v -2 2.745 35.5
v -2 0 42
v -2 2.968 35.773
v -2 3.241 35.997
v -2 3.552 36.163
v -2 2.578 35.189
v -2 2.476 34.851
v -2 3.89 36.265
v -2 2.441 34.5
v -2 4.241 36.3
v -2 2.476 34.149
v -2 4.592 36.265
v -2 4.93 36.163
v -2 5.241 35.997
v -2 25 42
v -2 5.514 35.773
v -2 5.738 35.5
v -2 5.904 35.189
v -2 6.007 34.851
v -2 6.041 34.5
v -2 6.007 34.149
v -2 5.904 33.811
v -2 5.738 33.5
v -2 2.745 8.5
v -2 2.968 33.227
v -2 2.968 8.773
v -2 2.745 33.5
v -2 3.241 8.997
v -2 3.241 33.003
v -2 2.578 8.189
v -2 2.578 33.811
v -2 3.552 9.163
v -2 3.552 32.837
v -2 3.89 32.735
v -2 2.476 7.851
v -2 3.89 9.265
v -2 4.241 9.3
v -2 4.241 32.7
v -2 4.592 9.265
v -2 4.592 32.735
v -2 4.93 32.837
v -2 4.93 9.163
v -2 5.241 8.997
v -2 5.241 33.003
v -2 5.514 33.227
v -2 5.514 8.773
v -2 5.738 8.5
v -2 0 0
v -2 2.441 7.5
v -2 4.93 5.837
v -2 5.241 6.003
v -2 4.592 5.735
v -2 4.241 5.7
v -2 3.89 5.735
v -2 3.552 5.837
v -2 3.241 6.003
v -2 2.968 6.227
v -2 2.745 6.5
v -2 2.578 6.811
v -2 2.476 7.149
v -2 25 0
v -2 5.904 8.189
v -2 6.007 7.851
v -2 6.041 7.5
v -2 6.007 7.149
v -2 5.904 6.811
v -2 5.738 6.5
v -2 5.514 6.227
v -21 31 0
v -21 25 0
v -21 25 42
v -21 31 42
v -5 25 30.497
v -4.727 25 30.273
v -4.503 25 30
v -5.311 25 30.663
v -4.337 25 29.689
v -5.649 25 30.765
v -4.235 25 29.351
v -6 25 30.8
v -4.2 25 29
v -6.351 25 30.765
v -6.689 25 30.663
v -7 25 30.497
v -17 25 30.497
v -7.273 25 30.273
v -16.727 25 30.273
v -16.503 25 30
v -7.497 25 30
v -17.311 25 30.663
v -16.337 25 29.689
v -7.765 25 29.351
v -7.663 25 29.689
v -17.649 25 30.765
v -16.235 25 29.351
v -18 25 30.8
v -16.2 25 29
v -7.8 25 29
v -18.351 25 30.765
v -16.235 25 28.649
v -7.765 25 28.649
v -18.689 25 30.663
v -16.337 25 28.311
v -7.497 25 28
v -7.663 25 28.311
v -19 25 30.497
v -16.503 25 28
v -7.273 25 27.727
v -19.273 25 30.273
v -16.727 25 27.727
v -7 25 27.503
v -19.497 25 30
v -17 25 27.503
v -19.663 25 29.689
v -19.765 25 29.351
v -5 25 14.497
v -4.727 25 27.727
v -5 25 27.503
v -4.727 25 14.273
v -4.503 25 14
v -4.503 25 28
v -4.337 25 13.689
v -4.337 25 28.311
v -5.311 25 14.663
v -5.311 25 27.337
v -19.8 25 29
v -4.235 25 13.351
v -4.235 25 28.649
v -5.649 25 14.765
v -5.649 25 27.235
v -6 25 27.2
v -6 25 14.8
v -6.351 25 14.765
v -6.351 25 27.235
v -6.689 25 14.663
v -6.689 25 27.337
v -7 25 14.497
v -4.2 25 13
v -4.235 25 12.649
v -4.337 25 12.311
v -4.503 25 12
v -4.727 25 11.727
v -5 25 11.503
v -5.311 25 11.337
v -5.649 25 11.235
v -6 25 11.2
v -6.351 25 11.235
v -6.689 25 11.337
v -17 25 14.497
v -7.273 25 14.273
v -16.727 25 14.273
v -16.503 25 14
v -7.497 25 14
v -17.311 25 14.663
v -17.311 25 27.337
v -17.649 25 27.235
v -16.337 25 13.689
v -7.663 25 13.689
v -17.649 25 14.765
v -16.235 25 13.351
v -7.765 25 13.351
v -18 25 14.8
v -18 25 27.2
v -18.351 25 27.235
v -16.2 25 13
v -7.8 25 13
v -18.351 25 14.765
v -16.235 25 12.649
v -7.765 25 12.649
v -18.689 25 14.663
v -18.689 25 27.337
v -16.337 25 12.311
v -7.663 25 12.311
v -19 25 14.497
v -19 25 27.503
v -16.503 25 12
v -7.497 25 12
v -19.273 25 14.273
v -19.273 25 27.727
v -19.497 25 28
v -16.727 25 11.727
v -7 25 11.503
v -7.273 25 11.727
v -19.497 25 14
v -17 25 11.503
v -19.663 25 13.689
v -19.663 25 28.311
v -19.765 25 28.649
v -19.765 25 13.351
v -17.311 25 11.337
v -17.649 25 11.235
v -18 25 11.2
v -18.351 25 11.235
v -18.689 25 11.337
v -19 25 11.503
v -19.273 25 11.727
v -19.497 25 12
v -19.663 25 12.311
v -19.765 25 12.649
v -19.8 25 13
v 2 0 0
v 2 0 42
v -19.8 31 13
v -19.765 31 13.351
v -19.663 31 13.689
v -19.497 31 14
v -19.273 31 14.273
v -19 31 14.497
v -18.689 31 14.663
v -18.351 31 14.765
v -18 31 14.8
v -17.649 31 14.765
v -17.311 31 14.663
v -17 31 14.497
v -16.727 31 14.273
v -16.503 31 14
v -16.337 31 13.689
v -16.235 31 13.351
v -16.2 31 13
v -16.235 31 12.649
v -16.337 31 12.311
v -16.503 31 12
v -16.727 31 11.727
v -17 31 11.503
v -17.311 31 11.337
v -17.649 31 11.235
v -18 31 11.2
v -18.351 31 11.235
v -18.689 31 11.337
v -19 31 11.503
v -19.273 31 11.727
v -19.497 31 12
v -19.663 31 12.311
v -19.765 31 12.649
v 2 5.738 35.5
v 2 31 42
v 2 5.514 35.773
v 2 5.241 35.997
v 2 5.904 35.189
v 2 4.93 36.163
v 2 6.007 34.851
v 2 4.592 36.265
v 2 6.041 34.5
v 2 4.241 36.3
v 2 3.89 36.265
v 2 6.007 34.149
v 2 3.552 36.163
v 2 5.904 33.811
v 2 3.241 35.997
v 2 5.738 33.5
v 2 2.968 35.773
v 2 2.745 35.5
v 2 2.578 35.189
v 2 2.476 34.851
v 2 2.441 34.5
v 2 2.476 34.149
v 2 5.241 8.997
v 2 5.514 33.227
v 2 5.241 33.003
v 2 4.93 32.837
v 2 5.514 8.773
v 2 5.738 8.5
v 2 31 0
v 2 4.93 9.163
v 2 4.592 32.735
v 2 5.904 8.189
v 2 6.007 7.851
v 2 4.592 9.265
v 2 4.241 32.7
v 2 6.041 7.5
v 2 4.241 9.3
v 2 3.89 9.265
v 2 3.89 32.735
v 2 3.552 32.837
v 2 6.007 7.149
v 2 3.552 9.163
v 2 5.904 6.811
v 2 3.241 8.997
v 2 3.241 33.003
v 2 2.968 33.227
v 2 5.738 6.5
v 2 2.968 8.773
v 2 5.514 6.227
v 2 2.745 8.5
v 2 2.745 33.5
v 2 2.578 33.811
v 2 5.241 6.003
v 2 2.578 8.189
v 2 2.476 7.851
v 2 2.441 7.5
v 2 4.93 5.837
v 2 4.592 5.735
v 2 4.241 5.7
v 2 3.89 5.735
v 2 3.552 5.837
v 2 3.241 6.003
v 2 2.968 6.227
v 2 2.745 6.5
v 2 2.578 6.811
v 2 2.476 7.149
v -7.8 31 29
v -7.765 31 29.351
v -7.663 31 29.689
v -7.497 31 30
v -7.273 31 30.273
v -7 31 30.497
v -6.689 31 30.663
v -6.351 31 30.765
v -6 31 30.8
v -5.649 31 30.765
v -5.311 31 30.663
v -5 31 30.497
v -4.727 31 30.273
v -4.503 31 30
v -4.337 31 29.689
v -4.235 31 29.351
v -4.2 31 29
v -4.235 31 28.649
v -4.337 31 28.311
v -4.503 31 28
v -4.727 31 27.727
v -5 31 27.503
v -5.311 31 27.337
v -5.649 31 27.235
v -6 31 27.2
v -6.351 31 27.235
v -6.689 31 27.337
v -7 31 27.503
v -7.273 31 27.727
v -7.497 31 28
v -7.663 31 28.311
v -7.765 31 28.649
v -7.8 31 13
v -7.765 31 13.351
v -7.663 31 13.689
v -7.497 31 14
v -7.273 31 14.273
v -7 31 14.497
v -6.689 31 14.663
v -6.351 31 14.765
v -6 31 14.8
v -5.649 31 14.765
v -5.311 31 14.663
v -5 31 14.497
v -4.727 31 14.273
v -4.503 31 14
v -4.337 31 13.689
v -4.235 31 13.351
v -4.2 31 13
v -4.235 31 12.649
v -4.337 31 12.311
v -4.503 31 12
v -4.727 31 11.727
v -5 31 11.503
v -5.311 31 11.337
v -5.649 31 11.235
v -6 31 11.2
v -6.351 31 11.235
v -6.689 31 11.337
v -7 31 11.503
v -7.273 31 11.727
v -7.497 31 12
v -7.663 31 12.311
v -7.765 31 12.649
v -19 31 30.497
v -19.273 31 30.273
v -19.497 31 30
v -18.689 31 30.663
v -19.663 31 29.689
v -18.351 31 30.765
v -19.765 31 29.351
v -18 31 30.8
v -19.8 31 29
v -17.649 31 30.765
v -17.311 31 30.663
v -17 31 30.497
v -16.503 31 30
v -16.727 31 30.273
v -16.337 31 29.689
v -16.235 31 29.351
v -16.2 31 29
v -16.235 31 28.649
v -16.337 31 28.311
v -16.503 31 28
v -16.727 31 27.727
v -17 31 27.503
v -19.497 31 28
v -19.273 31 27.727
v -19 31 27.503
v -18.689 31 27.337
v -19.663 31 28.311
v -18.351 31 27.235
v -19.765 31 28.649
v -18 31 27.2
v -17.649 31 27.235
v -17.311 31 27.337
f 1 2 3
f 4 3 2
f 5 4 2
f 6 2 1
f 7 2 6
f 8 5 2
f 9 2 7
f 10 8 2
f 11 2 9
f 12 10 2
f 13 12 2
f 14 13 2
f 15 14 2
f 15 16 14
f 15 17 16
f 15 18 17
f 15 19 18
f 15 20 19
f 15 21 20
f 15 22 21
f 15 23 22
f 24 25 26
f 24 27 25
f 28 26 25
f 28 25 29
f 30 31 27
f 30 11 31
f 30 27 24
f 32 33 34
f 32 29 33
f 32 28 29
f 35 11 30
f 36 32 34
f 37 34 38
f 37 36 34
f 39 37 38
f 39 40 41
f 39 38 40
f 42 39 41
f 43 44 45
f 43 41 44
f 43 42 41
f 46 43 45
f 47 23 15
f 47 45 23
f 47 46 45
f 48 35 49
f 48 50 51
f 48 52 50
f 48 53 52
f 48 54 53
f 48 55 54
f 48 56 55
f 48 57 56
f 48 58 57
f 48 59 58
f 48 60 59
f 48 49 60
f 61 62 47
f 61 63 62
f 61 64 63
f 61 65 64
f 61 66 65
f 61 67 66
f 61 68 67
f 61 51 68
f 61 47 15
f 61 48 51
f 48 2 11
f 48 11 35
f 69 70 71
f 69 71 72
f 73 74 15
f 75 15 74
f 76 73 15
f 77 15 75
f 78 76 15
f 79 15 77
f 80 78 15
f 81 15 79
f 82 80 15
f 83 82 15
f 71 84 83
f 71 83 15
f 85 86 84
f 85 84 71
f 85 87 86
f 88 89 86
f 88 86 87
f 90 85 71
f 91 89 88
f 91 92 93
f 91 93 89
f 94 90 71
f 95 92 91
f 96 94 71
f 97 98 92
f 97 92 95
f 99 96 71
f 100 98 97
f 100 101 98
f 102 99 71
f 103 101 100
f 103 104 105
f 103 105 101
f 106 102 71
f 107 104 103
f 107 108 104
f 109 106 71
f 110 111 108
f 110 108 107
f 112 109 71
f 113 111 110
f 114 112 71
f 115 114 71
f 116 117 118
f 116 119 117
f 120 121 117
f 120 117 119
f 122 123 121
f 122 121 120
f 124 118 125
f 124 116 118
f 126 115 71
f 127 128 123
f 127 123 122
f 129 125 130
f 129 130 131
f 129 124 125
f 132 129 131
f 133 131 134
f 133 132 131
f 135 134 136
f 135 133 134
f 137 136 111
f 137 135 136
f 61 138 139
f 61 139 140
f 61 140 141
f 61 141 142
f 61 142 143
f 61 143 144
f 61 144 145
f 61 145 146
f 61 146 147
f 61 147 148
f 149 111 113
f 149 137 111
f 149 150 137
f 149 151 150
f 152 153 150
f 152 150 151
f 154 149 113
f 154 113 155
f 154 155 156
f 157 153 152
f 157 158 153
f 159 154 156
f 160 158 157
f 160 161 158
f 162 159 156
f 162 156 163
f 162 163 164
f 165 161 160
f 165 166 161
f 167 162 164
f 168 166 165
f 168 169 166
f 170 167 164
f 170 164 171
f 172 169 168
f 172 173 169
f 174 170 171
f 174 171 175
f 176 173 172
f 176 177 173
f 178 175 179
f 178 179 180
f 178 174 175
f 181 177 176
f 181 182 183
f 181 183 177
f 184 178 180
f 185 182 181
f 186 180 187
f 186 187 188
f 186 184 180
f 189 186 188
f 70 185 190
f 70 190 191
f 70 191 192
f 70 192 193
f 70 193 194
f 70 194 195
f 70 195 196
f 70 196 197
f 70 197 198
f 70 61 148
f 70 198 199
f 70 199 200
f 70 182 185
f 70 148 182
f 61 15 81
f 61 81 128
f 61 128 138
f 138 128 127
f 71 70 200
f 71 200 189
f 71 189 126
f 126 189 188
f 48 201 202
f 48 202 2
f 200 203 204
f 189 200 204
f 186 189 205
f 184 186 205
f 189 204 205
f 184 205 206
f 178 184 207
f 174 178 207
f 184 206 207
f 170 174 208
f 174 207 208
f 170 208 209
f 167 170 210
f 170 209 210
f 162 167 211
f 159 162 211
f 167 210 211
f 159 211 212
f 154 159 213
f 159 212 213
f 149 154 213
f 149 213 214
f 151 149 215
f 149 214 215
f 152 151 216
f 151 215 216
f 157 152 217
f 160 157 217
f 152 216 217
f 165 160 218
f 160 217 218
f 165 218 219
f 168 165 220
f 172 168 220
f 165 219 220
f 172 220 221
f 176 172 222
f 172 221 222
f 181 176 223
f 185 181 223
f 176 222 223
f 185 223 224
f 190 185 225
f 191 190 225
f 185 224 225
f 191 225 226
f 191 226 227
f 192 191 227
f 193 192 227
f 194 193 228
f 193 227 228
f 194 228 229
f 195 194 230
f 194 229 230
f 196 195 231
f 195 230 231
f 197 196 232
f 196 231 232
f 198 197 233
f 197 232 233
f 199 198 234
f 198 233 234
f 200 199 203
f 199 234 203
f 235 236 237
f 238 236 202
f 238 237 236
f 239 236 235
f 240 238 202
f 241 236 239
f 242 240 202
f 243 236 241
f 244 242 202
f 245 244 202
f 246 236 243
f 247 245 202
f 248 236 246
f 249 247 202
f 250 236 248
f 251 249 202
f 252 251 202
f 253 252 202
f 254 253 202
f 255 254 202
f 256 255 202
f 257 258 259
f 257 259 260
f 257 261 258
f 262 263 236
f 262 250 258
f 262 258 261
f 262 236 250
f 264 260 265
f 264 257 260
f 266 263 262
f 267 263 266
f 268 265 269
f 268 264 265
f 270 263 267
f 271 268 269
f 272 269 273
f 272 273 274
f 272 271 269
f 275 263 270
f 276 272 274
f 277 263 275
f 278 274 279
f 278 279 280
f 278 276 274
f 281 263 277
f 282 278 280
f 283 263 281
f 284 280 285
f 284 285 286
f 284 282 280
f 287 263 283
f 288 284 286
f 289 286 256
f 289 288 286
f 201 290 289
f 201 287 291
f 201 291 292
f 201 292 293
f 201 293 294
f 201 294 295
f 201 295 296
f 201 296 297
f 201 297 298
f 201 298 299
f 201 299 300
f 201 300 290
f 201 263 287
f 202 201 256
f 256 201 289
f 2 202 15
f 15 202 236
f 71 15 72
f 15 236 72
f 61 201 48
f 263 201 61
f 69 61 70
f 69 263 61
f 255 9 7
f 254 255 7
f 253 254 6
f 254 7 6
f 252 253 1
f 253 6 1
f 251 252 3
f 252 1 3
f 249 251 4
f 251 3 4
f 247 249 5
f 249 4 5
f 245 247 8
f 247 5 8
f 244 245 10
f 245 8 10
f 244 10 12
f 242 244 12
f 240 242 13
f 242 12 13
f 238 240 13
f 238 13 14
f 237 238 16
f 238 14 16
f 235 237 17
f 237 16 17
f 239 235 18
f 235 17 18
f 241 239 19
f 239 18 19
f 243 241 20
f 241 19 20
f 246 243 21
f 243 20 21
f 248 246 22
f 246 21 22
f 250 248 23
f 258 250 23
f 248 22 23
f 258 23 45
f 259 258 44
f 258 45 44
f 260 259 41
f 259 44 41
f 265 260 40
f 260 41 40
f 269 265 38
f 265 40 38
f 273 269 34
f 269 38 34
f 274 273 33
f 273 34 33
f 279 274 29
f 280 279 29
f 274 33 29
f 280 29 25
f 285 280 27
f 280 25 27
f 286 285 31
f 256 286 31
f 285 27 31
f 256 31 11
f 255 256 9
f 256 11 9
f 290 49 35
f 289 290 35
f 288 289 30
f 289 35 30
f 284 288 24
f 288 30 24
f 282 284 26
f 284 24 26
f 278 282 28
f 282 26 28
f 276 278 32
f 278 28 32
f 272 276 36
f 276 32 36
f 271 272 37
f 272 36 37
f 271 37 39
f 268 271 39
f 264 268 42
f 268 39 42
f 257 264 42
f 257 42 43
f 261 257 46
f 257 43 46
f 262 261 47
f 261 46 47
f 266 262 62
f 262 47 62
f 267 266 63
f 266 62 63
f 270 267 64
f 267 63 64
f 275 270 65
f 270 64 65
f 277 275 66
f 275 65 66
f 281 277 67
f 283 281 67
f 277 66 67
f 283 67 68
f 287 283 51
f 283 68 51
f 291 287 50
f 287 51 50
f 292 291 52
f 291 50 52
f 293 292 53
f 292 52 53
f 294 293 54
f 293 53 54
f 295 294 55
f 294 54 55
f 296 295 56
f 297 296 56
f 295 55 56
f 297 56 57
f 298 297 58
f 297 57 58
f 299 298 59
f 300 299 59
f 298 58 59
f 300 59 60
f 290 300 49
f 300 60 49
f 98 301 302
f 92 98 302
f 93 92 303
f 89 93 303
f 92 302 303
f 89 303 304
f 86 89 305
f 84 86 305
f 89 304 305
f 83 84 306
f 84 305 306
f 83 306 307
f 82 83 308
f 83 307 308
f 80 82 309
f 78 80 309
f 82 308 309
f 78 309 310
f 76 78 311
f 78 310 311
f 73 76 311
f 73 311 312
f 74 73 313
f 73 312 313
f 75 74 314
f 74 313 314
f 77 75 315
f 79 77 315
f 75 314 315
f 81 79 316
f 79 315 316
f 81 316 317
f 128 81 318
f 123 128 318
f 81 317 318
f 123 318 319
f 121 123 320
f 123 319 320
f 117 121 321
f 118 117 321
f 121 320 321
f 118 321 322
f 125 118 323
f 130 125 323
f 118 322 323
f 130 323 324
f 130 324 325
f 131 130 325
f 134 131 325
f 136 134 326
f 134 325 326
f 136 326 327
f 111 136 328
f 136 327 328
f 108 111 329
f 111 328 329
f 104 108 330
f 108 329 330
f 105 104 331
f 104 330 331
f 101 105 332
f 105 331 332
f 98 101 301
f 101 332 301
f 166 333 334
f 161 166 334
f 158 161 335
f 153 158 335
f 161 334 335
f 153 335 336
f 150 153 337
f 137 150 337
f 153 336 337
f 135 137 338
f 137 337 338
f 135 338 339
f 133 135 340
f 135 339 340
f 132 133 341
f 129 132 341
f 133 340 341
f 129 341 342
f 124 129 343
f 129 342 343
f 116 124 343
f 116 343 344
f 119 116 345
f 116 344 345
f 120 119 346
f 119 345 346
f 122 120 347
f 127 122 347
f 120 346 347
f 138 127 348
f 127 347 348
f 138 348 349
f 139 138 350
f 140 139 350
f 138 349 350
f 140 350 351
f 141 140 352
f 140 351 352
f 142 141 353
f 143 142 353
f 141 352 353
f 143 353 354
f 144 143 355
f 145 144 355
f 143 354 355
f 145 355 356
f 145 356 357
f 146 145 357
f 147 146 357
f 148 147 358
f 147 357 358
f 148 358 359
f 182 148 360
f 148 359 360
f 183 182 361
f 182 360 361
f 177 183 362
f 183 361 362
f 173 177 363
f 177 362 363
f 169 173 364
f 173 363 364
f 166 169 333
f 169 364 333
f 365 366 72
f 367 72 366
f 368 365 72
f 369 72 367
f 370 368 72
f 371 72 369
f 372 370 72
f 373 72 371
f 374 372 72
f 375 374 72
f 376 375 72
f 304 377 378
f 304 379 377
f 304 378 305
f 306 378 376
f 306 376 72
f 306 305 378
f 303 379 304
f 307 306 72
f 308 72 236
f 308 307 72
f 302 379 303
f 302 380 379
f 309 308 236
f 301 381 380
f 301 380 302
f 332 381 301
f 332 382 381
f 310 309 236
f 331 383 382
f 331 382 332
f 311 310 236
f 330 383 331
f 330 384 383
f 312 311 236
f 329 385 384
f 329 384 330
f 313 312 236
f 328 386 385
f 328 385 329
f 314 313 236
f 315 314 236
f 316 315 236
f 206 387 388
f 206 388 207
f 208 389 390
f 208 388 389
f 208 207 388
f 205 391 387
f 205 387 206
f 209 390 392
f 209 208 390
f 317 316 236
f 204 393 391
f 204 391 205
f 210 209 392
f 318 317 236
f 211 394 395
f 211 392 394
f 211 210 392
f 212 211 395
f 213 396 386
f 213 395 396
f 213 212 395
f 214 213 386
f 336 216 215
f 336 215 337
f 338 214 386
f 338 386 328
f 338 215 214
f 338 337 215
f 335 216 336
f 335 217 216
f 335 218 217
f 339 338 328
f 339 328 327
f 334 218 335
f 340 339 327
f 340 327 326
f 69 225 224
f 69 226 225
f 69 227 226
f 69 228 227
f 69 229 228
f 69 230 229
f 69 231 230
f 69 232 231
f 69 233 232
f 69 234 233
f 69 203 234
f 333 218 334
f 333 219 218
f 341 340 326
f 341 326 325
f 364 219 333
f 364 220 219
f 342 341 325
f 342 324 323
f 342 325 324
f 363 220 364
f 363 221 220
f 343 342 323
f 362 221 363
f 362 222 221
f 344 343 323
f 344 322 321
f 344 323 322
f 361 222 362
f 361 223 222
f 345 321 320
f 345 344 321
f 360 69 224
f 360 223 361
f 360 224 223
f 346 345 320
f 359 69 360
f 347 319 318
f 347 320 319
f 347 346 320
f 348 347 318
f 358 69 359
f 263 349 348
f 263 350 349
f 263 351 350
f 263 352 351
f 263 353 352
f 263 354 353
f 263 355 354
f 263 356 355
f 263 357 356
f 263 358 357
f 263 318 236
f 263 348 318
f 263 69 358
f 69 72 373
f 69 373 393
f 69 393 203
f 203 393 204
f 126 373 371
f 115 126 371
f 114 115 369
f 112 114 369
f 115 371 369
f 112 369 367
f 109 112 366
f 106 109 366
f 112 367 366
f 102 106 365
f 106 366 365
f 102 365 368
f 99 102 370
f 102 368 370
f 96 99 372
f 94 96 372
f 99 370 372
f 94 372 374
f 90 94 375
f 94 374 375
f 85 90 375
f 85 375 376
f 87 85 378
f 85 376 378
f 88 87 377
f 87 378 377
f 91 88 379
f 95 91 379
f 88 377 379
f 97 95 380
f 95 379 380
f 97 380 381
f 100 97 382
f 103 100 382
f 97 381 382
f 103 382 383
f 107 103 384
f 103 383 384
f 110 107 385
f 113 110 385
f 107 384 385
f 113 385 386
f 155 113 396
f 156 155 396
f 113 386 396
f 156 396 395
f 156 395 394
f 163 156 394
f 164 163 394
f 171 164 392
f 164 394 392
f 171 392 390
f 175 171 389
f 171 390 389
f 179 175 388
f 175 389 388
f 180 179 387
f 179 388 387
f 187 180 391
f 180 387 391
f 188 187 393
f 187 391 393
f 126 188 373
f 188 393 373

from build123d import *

# Parameters (mm, degrees)
PAD_DEPTH       = 42
SKETCH001_R     = 1.8
POCKET_DEPTH    = 6
SKETCH002_R     = 1.8
POCKET001_DEPTH = 4


with BuildPart() as part:
    # Sketch → Pad (new body)
    with BuildSketch(Plane.XY):
        Polygon((-21, 31), (2, 31), (2, 0), (-2, 0), (-2, 25), (-21, 25), align=None)
    extrude(amount=PAD_DEPTH)

    # Sketch001 → Pocket (cut)
    with BuildSketch(Plane(origin=(0, 31, 0), x_dir=(-1, 0, 0), z_dir=(0, 1, 0))):
        with Locations((6, 29)):
            Circle(SKETCH001_R)
        with Locations((18, 29)):
            Circle(SKETCH001_R)
        with Locations((6, 13)):
            Circle(SKETCH001_R)
        with Locations((18, 13)):
            Circle(SKETCH001_R)
    extrude(amount=-POCKET_DEPTH, mode=Mode.SUBTRACT)

    # Sketch002 → Pocket001 (cut)
    with BuildSketch(Plane(origin=(-2, 0, 0), x_dir=(0, -1, 0), z_dir=(-1, 0, 0))):
        with Locations((-4.241278, 34.5)):
            Circle(SKETCH002_R)
        with Locations((-4.241278, 7.5)):
            Circle(SKETCH002_R)
    extrude(amount=-POCKET001_DEPTH, mode=Mode.SUBTRACT)


solid = part.part
